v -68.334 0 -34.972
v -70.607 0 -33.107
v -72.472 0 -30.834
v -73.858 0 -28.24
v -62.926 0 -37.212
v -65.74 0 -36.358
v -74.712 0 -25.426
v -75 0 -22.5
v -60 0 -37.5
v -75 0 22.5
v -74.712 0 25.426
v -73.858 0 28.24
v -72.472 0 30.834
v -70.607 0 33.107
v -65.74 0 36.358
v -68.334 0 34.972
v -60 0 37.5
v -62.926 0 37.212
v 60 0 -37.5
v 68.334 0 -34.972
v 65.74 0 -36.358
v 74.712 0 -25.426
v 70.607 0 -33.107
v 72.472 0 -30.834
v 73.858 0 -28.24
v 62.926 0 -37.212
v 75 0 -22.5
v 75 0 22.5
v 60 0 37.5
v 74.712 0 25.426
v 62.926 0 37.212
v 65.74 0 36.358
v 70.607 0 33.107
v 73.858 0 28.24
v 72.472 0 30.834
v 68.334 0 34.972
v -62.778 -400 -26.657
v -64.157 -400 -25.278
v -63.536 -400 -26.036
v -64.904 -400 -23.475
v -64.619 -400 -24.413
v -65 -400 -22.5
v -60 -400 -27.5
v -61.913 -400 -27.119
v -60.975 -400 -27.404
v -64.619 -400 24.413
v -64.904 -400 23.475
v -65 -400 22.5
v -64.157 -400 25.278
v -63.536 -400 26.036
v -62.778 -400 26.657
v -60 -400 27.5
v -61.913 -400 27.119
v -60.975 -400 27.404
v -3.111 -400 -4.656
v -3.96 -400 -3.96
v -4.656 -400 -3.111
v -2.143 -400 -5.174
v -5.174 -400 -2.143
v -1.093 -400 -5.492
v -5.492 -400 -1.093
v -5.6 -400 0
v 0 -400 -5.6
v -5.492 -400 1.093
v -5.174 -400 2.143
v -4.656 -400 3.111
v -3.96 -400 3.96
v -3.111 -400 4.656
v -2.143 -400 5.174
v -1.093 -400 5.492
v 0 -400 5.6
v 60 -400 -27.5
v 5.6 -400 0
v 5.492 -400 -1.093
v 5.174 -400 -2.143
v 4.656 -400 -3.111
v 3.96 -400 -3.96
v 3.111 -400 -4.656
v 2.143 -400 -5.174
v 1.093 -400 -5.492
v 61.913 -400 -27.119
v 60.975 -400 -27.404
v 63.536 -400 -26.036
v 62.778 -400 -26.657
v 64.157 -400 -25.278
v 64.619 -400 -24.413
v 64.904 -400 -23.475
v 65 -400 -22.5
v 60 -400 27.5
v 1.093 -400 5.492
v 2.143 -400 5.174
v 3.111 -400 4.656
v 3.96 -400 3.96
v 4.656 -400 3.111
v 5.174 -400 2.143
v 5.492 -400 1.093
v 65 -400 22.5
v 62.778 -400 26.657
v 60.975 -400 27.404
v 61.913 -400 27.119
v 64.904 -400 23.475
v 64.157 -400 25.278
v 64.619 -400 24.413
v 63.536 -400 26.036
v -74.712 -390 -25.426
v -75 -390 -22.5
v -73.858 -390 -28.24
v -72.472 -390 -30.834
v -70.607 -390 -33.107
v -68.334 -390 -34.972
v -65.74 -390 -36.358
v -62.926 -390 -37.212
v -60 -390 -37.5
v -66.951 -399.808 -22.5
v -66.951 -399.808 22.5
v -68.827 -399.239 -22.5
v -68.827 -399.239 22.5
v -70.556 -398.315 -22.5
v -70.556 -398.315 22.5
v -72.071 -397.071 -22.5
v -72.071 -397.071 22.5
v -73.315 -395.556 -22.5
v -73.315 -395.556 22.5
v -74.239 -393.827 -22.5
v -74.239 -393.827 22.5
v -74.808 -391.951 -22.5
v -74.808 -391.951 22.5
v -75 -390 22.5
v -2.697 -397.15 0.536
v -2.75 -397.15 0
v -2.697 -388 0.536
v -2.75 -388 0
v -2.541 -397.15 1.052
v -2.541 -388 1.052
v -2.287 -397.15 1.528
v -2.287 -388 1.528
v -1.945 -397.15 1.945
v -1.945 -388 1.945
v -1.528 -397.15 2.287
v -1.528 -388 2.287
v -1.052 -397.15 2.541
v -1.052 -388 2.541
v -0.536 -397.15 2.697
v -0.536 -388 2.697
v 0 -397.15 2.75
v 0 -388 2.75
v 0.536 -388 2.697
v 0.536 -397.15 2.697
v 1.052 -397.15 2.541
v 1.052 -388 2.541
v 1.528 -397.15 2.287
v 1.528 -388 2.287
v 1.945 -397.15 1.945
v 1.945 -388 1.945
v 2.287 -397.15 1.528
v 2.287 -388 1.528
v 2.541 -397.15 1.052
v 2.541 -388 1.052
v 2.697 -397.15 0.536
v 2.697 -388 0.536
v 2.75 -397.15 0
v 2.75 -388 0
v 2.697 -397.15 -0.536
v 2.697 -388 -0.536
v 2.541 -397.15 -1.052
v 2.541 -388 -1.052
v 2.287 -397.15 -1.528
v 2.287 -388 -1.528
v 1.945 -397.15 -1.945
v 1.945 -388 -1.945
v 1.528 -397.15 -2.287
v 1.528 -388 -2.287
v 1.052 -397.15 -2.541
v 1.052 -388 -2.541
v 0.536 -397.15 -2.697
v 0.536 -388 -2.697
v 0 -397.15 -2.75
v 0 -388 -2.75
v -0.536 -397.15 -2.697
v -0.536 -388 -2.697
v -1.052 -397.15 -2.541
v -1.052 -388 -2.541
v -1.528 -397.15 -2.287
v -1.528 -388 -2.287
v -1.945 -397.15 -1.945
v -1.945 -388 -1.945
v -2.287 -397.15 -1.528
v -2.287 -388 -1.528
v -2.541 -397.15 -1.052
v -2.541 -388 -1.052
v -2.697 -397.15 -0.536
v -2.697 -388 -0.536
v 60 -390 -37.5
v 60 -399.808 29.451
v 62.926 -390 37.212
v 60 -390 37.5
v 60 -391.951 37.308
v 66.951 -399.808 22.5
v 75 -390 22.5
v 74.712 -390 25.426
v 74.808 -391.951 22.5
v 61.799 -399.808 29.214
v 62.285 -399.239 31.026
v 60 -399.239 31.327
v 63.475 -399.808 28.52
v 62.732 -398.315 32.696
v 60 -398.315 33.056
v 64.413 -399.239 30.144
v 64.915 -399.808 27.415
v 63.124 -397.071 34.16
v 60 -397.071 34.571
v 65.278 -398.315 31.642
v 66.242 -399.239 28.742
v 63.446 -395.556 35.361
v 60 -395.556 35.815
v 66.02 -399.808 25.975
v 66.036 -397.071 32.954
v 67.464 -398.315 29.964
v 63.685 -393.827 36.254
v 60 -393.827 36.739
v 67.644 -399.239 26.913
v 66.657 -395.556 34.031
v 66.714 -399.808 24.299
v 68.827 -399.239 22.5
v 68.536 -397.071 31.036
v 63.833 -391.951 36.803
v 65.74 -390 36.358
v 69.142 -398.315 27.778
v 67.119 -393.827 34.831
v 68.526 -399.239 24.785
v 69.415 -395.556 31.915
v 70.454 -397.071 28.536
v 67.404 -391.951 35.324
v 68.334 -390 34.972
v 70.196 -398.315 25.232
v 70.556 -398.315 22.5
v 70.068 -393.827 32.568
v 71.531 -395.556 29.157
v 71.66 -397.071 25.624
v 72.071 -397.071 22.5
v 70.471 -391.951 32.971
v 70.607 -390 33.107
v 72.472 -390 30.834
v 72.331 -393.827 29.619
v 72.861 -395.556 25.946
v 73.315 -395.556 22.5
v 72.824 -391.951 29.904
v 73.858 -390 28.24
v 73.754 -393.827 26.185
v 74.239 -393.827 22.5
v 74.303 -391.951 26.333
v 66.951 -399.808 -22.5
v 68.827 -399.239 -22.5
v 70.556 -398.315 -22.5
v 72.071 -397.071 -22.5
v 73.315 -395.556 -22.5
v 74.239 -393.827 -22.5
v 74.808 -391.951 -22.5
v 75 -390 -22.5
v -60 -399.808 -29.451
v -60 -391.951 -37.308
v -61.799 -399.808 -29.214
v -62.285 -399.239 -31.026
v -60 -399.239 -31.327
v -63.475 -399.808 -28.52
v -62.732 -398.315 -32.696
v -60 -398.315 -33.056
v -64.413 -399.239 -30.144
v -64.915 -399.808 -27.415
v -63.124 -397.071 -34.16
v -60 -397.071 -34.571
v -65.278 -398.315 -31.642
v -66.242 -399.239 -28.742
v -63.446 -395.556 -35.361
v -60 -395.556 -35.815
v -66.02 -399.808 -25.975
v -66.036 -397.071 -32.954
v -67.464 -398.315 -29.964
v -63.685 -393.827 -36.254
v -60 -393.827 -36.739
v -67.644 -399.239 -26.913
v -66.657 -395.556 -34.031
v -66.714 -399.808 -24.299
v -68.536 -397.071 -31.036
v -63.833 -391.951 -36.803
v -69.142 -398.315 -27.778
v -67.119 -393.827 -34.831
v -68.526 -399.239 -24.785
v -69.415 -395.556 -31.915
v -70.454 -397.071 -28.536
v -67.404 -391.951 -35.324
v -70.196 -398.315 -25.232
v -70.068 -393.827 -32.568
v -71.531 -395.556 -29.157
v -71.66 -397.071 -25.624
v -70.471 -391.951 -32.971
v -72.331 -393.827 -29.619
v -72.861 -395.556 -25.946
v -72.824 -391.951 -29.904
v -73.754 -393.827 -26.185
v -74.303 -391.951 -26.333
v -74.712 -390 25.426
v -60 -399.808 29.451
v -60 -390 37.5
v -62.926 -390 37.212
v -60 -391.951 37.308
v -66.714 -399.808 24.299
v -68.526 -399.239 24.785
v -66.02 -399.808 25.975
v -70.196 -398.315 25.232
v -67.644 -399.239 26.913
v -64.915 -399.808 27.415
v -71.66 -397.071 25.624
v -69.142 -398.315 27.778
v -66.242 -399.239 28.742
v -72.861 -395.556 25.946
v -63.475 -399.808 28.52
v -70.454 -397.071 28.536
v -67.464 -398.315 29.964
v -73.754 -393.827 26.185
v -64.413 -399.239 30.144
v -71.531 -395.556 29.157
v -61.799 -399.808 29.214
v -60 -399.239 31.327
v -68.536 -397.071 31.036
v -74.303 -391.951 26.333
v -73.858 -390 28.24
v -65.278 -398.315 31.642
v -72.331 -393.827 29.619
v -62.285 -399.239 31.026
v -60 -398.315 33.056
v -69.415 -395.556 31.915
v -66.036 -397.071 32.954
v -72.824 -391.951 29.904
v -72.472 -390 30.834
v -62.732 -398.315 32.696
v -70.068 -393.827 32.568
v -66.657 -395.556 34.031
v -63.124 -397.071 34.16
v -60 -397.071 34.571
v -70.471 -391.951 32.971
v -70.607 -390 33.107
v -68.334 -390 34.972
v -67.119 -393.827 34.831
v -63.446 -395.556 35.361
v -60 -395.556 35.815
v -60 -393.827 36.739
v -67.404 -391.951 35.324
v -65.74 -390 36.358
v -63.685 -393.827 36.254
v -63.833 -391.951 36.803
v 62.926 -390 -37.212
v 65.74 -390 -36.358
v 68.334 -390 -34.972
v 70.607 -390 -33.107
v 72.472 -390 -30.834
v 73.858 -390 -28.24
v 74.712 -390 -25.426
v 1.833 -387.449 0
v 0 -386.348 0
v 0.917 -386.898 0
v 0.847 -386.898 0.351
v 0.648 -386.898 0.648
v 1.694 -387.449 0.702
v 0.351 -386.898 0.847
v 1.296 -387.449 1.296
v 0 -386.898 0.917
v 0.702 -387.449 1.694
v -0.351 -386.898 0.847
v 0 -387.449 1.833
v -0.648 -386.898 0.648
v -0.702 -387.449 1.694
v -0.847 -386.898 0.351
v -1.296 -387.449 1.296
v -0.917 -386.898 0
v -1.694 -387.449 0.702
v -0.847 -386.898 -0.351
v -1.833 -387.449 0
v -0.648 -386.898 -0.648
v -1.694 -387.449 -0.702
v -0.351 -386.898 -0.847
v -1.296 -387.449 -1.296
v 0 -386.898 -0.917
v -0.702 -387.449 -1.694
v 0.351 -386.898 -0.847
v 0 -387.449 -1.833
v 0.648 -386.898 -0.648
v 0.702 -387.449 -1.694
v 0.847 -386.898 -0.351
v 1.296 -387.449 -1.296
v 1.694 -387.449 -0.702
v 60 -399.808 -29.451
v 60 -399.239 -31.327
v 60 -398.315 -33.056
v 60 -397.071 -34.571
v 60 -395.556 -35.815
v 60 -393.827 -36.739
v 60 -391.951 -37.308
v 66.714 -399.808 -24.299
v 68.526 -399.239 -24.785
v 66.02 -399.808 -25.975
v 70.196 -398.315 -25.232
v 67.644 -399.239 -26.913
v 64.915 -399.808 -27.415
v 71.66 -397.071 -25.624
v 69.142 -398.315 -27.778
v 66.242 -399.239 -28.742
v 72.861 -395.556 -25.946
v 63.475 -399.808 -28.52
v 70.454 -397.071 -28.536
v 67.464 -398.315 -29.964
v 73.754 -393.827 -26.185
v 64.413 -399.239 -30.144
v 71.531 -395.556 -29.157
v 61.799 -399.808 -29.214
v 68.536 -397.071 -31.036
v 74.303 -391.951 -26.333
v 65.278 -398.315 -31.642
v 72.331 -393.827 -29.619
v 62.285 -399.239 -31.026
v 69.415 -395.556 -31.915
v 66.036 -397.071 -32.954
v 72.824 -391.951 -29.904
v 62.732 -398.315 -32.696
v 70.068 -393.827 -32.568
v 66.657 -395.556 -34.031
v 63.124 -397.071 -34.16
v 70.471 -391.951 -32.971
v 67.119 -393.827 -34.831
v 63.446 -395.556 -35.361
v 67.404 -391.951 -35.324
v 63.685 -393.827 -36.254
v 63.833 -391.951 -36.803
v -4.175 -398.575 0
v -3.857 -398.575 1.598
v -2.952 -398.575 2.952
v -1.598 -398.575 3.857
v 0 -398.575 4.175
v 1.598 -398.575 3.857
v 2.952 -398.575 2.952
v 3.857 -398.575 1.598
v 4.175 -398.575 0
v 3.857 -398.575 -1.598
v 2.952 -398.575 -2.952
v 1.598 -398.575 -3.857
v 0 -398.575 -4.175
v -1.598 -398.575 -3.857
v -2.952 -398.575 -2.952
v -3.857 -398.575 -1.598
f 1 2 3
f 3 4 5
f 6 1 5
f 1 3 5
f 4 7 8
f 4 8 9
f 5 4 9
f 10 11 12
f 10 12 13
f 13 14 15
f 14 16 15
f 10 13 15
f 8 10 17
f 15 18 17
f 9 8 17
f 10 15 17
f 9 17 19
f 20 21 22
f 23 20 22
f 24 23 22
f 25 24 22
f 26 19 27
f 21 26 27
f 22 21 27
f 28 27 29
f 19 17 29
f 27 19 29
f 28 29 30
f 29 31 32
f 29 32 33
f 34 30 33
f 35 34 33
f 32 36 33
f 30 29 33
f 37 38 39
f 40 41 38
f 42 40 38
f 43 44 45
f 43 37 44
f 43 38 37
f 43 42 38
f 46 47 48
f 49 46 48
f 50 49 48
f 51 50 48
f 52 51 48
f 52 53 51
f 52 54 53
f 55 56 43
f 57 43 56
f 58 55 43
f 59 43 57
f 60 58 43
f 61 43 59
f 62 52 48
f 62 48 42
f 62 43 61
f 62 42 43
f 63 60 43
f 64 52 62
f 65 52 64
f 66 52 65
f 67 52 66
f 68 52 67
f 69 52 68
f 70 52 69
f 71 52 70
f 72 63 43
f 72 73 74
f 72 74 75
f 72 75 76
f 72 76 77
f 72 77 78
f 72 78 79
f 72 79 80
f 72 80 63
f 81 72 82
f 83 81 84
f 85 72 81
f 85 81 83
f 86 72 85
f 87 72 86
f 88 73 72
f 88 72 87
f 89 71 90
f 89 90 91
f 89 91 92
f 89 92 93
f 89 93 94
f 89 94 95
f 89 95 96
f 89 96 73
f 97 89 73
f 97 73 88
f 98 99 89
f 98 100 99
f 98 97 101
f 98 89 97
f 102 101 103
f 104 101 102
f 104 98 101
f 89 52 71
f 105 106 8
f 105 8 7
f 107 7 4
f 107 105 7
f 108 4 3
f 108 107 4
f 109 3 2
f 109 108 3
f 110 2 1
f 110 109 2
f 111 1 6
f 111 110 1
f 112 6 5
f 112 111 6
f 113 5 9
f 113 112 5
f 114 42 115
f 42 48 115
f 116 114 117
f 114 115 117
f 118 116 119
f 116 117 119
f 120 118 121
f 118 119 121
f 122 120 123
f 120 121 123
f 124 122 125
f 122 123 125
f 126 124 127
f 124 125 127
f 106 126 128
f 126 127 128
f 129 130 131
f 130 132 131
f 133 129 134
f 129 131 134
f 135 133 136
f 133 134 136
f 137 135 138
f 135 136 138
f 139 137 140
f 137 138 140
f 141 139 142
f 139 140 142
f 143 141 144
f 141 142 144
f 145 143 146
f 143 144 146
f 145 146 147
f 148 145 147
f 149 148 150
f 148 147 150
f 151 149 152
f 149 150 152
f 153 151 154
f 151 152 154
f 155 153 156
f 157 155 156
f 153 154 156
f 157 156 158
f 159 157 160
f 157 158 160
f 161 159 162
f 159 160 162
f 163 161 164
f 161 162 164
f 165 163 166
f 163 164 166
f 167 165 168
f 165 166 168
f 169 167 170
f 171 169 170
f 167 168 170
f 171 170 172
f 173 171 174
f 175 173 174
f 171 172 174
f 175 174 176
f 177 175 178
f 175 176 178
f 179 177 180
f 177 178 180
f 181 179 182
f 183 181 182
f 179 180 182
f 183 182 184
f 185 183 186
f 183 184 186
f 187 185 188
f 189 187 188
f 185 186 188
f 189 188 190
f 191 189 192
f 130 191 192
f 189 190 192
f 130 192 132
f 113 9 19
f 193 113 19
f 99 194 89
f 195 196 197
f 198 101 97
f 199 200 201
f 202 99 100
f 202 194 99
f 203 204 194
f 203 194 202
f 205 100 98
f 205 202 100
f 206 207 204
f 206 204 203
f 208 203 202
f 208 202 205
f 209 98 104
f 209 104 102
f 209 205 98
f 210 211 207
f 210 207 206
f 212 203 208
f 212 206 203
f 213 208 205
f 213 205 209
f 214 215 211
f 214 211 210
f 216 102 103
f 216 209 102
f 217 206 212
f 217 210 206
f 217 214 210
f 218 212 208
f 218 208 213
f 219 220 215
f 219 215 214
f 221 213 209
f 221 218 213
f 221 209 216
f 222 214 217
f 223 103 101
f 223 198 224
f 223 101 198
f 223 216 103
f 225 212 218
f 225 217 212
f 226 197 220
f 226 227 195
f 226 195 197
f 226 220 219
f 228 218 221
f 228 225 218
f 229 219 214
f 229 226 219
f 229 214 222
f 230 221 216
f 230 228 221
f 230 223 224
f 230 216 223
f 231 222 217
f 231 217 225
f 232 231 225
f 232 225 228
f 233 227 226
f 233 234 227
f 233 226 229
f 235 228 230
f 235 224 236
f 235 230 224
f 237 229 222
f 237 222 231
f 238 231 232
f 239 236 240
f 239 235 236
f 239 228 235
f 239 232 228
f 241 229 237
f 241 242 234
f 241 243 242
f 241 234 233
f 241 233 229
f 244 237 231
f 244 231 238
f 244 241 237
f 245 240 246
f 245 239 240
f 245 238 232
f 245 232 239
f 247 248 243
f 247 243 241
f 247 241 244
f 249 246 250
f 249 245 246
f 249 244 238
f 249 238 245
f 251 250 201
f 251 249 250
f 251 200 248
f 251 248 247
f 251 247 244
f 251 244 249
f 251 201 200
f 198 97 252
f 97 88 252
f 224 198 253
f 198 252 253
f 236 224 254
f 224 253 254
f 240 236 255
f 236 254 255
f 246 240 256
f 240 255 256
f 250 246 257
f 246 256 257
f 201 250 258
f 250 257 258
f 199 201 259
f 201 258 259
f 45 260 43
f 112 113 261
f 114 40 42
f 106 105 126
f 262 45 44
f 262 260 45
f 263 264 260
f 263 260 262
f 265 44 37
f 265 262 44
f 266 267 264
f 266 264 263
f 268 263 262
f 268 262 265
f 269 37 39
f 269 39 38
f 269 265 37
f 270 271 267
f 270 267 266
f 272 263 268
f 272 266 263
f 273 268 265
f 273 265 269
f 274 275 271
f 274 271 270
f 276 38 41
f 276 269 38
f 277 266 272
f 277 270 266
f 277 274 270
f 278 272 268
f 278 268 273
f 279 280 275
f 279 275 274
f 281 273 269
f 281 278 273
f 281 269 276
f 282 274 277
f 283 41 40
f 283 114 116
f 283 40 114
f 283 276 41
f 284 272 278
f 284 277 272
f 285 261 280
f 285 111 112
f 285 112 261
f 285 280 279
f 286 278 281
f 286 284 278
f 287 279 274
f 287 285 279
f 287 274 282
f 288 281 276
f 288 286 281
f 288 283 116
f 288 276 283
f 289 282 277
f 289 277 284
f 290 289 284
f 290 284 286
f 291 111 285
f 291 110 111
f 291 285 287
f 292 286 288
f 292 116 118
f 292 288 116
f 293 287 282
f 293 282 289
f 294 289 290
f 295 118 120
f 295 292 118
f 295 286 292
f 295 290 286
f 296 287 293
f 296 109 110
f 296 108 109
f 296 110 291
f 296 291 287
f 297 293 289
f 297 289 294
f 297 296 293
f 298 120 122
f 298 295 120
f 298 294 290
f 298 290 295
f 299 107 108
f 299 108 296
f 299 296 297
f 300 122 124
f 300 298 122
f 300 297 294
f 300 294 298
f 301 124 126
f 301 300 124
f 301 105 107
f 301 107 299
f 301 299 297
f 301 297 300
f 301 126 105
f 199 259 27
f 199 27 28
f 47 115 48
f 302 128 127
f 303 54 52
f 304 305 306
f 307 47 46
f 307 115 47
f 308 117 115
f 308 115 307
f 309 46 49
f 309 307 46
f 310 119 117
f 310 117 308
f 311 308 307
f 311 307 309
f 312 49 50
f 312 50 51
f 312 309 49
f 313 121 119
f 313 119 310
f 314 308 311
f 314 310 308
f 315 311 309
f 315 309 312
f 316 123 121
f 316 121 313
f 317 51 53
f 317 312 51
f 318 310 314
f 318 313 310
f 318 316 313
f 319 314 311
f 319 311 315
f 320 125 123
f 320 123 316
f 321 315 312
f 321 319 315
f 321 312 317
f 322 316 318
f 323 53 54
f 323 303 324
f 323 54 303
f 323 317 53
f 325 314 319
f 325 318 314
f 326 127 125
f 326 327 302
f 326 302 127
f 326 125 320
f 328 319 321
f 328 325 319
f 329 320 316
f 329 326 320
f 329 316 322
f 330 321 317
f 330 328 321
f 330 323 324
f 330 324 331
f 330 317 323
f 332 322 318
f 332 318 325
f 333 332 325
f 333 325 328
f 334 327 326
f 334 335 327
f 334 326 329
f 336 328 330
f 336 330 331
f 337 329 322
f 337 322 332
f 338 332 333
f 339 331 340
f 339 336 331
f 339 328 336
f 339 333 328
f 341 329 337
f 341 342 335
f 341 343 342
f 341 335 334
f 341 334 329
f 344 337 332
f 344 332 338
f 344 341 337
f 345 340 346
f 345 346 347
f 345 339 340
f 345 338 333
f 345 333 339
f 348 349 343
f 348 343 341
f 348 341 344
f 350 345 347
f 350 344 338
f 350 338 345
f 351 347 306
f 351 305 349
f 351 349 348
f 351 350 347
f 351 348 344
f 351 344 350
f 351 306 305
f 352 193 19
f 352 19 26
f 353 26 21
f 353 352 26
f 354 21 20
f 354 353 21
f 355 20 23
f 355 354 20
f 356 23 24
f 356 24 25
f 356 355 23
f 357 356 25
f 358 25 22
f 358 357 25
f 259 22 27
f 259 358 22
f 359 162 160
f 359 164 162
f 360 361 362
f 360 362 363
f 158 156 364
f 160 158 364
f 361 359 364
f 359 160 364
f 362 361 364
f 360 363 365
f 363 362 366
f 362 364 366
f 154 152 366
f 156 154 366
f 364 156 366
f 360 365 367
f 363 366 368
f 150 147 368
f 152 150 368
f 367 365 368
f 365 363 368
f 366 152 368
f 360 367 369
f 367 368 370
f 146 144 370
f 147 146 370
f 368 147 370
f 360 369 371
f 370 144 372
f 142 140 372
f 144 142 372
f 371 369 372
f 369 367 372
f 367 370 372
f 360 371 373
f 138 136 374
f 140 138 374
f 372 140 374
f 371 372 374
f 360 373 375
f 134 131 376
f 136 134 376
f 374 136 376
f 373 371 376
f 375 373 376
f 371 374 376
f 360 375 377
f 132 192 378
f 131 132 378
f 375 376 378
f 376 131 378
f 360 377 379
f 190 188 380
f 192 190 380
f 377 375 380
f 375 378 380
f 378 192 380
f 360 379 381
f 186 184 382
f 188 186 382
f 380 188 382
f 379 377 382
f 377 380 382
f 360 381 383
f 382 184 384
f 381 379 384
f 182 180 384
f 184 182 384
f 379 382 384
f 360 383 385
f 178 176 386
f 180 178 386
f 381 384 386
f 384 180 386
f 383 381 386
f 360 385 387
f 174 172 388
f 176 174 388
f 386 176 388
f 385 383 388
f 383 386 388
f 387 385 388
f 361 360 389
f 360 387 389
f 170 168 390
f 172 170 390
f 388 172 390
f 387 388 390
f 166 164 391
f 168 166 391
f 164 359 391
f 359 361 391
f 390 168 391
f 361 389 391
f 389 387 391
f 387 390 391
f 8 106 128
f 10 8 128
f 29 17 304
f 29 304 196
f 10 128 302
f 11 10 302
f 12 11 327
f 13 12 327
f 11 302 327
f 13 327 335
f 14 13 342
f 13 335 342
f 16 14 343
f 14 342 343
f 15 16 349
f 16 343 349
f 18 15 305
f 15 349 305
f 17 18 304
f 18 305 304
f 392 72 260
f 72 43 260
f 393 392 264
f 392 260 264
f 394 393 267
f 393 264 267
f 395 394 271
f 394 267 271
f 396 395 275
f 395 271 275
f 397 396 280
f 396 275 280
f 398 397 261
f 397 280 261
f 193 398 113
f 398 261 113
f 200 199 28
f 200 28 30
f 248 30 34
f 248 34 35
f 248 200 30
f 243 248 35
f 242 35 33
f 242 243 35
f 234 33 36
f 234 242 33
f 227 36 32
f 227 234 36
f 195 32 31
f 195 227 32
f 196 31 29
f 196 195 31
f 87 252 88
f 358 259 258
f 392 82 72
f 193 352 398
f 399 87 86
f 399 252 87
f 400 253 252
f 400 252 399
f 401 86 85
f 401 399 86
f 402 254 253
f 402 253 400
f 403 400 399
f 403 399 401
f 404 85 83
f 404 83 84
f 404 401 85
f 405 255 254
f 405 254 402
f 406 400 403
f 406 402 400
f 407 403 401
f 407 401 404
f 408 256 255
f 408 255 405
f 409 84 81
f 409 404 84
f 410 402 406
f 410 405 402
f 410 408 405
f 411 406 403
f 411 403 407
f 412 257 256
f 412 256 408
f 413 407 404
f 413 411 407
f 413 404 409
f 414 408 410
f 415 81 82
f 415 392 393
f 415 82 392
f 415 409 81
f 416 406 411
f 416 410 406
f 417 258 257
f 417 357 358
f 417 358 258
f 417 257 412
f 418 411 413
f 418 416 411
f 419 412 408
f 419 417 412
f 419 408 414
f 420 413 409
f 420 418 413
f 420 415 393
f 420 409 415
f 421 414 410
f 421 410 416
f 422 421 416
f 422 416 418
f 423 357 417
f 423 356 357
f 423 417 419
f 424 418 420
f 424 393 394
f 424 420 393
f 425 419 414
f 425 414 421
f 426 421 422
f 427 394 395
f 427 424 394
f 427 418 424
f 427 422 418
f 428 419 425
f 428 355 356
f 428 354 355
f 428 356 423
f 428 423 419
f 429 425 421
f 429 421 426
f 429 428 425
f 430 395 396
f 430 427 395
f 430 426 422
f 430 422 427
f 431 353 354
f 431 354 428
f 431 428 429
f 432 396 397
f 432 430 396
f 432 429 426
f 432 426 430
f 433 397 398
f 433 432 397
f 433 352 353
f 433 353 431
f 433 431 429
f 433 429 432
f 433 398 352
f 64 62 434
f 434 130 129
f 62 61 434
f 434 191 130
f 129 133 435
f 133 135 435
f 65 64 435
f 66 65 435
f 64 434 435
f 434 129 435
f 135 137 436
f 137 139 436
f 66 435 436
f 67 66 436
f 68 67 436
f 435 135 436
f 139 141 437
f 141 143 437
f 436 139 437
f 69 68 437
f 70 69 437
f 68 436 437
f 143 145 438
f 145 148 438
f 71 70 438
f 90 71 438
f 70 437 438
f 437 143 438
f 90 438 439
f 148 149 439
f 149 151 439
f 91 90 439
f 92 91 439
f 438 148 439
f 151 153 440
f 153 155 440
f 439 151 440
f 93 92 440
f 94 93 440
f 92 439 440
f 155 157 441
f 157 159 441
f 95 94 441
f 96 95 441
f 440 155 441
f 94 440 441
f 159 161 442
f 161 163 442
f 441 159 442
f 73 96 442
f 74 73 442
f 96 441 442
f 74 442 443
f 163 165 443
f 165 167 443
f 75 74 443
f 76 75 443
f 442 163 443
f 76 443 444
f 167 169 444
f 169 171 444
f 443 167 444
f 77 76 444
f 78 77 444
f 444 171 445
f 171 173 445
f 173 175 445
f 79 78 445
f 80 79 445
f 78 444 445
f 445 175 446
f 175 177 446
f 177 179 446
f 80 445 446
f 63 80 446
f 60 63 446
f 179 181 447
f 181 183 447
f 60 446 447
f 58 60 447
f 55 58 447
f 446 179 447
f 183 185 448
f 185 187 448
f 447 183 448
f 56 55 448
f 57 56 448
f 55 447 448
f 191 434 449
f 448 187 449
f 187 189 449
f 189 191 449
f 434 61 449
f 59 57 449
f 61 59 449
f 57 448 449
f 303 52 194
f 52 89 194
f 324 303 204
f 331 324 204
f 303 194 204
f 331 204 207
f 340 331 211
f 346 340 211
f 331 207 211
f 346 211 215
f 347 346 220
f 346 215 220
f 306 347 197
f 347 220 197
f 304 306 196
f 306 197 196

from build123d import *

# Parameters (mm, degrees)
F0_W           = 150
F0_H           = 75
F1_DEPTH       = 400
F2_R           = 15
F4_D           = 5.5
F4_DEPTH       = 12
F4_CSINK_D     = 11.2
F4_CSINK_ANGLE = 90
F4_TIP         = 1.6523667023
F5_R           = 10


with BuildPart() as f1:
    # F0 (on Front) → F1 (new body)
    with BuildSketch(Plane.XZ):
        Rectangle(F0_W, F0_H)
    extrude(amount=F1_DEPTH)

    # F2
    f2_edges = [f1.edges().sort_by_distance(p)[0] for p in [
        (75, -200, 37.5),
        (75, -200, -37.5),
        (-75, -200, 37.5),
        (-75, -200, -37.5),
    ]]
    fillet(f2_edges, radius=F2_R)

    # F4
    with Locations(Plane.XZ.offset(400)):
        with Locations((0, 0)):
            CounterSinkHole(F4_D / 2, F4_CSINK_D / 2, depth=F4_DEPTH, counter_sink_angle=F4_CSINK_ANGLE)
            with Locations((0, 0, -(F4_DEPTH + F4_TIP / 2))):  # 118° drill point
                Cone(0, F4_D / 2, F4_TIP, mode=Mode.SUBTRACT)

    # F5
    f5_edges = [f1.edges().sort_by_distance(p)[0] for p in [
        (0, -400, 37.5),
    ]]
    fillet(f5_edges, radius=F5_R)


solid = f1.part
